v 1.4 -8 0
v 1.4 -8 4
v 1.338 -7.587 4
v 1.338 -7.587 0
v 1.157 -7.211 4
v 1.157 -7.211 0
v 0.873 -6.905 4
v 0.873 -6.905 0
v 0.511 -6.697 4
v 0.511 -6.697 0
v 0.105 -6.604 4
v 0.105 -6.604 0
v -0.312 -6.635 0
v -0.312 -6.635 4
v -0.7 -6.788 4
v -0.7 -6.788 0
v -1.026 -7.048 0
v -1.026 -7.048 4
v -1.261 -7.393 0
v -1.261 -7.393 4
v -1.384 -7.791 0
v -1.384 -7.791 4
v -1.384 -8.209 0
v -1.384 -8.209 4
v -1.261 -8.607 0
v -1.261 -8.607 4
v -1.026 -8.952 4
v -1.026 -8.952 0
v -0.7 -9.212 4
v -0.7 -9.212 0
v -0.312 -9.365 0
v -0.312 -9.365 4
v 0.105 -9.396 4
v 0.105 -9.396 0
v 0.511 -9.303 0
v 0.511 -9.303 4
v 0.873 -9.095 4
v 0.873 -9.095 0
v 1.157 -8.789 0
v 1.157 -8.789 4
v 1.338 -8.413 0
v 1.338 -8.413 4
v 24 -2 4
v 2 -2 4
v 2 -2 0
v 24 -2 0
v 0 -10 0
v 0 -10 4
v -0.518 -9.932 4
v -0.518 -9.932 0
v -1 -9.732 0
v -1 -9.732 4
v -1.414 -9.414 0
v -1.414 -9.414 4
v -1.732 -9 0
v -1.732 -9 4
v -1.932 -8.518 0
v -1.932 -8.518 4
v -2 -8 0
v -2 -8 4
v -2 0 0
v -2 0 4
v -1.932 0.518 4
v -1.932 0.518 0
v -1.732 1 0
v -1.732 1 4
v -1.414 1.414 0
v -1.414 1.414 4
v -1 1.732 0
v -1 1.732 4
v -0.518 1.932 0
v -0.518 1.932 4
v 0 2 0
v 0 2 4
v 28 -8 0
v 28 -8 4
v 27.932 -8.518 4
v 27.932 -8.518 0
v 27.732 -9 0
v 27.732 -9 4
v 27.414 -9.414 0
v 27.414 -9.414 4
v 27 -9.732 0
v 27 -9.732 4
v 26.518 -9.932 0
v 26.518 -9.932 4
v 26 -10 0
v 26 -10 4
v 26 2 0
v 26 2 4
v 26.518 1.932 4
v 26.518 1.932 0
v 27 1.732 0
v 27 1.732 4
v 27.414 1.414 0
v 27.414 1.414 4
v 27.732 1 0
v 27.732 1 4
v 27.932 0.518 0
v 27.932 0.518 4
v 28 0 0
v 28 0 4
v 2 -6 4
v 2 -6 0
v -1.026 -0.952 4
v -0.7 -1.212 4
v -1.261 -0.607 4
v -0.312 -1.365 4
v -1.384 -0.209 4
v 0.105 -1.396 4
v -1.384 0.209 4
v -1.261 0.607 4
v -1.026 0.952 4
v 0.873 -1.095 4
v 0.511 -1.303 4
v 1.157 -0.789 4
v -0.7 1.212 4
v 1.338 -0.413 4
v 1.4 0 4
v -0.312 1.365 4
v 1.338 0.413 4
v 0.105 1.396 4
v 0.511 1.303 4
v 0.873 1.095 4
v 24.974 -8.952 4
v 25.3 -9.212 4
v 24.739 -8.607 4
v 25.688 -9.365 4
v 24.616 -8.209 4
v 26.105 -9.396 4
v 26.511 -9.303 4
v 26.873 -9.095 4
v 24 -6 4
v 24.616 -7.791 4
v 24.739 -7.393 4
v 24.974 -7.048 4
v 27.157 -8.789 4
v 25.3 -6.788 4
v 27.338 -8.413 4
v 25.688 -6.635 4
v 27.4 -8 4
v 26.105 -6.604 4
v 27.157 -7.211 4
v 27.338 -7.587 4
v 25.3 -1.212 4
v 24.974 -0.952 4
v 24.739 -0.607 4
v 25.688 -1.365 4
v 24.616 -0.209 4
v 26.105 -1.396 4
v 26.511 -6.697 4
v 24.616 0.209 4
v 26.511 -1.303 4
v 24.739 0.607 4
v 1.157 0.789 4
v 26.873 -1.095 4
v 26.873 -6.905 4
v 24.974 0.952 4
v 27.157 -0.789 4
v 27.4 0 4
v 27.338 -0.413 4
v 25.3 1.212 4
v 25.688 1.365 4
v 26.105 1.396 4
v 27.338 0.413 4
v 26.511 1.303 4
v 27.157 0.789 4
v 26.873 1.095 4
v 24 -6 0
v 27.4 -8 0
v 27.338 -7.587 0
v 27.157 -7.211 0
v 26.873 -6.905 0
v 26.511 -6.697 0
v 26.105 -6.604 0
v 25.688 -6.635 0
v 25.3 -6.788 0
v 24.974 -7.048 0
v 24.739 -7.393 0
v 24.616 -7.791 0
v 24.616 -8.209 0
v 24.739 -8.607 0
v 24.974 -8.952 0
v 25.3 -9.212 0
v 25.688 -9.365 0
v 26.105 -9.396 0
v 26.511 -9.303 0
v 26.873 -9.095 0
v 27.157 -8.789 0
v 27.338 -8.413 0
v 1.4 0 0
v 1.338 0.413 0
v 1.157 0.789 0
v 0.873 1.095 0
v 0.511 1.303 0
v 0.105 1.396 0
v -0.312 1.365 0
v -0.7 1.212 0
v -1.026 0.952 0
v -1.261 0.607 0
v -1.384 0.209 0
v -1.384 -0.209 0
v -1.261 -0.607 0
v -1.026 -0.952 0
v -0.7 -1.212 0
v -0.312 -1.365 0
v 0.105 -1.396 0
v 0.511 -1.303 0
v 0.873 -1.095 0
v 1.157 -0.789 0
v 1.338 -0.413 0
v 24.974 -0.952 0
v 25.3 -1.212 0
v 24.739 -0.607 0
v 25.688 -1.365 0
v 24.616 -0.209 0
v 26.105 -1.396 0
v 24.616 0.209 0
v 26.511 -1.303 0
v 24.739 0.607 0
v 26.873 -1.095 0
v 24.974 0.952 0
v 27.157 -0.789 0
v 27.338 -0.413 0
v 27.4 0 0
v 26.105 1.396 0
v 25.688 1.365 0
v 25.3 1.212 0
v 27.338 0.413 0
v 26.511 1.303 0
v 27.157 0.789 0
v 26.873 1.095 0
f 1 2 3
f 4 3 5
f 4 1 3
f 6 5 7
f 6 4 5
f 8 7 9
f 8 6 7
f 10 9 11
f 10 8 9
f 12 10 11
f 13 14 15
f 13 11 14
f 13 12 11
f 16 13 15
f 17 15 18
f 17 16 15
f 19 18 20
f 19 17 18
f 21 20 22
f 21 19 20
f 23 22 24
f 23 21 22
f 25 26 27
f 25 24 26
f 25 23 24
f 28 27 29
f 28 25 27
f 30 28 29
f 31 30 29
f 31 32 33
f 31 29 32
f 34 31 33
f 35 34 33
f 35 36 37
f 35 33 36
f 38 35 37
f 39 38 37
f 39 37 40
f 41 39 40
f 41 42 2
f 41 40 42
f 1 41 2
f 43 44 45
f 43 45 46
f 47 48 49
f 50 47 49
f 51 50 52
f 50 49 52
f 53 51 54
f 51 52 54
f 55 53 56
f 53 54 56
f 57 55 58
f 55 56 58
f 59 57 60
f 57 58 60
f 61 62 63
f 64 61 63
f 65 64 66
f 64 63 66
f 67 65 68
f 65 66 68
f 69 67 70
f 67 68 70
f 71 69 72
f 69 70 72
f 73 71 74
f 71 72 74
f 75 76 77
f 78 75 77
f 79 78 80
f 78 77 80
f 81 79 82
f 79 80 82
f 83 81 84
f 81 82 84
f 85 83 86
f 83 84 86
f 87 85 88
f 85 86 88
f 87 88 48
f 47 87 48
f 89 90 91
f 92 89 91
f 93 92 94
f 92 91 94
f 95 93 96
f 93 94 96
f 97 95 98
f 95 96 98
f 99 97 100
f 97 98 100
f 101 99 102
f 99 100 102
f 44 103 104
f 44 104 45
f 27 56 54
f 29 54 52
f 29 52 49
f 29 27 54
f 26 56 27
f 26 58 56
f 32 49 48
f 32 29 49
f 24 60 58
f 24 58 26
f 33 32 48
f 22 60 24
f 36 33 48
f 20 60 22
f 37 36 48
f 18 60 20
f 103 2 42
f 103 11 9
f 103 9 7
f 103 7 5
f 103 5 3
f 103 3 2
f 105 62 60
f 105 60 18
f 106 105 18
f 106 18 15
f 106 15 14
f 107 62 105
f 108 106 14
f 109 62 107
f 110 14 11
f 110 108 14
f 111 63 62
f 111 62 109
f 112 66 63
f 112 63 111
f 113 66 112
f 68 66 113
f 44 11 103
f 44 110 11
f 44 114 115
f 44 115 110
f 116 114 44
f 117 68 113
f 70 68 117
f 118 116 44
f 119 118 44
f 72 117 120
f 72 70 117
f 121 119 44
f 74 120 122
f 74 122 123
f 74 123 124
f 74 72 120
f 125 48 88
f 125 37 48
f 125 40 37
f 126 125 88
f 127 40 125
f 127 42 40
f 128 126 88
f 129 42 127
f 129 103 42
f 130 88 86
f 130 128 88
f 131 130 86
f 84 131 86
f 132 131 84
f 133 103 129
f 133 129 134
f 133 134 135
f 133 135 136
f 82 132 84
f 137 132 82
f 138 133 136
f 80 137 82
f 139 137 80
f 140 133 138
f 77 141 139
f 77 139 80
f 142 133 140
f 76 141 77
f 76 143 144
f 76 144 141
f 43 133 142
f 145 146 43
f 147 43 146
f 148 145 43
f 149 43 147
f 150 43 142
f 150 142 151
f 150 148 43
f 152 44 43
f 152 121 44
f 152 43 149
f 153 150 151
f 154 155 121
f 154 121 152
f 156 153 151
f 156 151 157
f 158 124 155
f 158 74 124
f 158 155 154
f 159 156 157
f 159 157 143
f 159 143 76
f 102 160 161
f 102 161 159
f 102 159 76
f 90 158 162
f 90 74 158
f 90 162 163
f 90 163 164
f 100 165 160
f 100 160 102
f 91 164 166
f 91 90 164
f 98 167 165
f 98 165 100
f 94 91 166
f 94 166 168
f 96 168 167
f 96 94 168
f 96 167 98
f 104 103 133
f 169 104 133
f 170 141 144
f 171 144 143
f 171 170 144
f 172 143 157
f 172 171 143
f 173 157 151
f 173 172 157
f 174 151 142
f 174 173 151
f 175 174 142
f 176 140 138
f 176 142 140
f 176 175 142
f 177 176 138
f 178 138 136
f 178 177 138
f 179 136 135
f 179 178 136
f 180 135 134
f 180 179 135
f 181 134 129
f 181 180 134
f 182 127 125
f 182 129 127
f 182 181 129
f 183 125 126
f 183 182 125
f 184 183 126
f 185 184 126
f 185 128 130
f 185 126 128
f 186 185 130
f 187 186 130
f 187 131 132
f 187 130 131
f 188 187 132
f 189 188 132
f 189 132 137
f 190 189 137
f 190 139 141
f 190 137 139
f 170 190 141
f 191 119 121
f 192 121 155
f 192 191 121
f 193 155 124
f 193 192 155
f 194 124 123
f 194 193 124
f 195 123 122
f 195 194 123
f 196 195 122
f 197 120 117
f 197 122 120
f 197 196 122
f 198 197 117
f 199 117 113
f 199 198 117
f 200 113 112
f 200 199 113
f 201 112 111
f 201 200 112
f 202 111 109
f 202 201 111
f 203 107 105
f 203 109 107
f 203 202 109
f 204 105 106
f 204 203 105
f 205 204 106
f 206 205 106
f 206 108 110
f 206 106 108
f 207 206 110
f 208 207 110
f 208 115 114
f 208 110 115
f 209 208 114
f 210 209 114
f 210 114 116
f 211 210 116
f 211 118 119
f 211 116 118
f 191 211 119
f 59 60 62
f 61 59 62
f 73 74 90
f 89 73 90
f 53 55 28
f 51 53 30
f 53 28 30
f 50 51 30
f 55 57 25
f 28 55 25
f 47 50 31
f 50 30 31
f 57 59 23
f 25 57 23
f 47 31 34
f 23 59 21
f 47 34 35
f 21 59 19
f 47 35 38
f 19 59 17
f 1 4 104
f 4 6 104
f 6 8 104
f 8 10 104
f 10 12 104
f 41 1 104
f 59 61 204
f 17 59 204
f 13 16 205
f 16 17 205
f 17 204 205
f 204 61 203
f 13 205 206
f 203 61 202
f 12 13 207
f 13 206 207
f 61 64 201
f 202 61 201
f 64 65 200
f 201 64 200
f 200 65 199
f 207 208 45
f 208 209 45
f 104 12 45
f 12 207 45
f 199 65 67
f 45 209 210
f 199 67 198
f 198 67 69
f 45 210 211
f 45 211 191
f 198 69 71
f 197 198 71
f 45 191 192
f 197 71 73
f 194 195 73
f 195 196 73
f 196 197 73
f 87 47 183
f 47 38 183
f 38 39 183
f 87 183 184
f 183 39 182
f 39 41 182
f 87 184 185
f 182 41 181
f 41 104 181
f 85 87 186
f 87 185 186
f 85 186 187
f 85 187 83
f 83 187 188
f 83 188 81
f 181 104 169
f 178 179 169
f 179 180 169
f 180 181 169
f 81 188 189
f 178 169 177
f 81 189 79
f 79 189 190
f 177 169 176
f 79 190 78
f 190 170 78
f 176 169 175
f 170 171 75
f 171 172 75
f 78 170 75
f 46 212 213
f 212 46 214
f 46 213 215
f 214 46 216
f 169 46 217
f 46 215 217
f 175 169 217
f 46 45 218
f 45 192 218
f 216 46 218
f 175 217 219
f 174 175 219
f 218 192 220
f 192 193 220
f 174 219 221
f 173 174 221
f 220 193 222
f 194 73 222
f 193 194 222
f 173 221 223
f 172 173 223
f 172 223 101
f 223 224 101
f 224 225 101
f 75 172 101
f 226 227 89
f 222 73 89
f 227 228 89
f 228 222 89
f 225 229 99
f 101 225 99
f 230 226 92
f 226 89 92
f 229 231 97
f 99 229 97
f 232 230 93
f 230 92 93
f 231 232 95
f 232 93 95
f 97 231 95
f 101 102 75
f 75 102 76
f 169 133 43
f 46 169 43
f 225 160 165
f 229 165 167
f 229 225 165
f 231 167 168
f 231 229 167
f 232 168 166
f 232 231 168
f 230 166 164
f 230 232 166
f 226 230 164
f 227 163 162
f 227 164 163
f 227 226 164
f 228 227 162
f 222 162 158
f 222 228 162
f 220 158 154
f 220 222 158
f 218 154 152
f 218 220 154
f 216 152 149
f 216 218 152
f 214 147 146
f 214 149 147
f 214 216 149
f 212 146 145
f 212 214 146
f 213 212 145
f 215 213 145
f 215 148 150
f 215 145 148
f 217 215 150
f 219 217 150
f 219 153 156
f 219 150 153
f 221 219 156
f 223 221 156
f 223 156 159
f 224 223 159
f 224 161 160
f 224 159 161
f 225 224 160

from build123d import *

# Parameters (mm, degrees)
SKETCH1_R           = 1.4
SKETCH1_W           = 20
SKETCH1_H           = 2
BOSS_EXTRUDE1_DEPTH = 7
SKETCH2_W           = 22
SKETCH2_H           = 4
SKETCH2_W_2         = 20
SKETCH2_H_2         = 2
CUT_EXTRUDE1_DEPTH  = 8.5
SKETCH3_R           = 39.79885979
CUT_EXTRUDE2_DEPTH  = 3


with BuildPart() as part:
    # Sketch1 → Boss-Extrude1 (new body)
    with BuildSketch(Plane.XY):
        with BuildLine():
            Line((-3, 0), (-3, -8))
            ThreePointArc((-3, -8), (-2.121320344, -10.121320344), (0, -11))
            Line((0, -11), (26, -11))
            ThreePointArc((26, -11), (28.121320344, -10.121320344), (29, -8))
            Line((29, -8), (29, 0))
            ThreePointArc((29, 0), (28.121320344, 2.121320344), (26, 3))
            Line((26, 3), (0, 3))
            ThreePointArc((0, 3), (-2.121320344, 2.121320344), (-3, 0))
        make_face()
        Circle(SKETCH1_R, mode=Mode.SUBTRACT)
        with Locations((0, -8)):
            Circle(SKETCH1_R, mode=Mode.SUBTRACT)
        with Locations((26, 0)):
            Circle(SKETCH1_R, mode=Mode.SUBTRACT)
        with Locations((26, -8)):
            Circle(SKETCH1_R, mode=Mode.SUBTRACT)
        with Locations((13, -4)):
            Rectangle(SKETCH1_W, SKETCH1_H, mode=Mode.SUBTRACT)
    extrude(amount=BOSS_EXTRUDE1_DEPTH)

    # Sketch2 → Cut-Extrude1 (cut)
    with BuildSketch(Plane.XY.offset(7)):
        with BuildLine():
            Line((26, 3), (0, 3))
            ThreePointArc((0, 3), (-2.121320344, 2.121320344), (-3, 0))
            Line((-3, 0), (-3, -8))
            ThreePointArc((-3, -8), (-2.121320344, -10.121320344), (0, -11))
            Line((0, -11), (26, -11))
            ThreePointArc((26, -11), (28.121320344, -10.121320344), (29, -8))
            Line((29, -8), (29, 0))
            ThreePointArc((29, 0), (28.121320344, 2.121320344), (26, 3))
        make_face()
        with BuildLine():
            Line((-2, -8), (-2, 0))
            ThreePointArc((-2, 0), (-1.414213562, 1.414213562), (0, 2))
            Line((0, 2), (26, 2))
            ThreePointArc((26, 2), (27.414213562, 1.414213562), (28, 0))
            Line((28, 0), (28, -8))
            ThreePointArc((28, -8), (27.414213562, -9.414213562), (26, -10))
            Line((26, -10), (0, -10))
            ThreePointArc((0, -10), (-1.414213562, -9.414213562), (-2, -8))
        make_face(mode=Mode.SUBTRACT)
        with Locations((13, -4)):
            Rectangle(SKETCH2_W, SKETCH2_H)
        with Locations((13, -4)):
            Rectangle(SKETCH2_W_2, SKETCH2_H_2, mode=Mode.SUBTRACT)
    extrude(amount=-CUT_EXTRUDE1_DEPTH, mode=Mode.SUBTRACT)

    # Sketch3 → Cut-Extrude2 (cut)
    with BuildSketch(Plane.XY.offset(7)):
        with Locations((0, 0.278776736)):
            Circle(SKETCH3_R)
    extrude(amount=-CUT_EXTRUDE2_DEPTH, mode=Mode.SUBTRACT)


solid = part.part
